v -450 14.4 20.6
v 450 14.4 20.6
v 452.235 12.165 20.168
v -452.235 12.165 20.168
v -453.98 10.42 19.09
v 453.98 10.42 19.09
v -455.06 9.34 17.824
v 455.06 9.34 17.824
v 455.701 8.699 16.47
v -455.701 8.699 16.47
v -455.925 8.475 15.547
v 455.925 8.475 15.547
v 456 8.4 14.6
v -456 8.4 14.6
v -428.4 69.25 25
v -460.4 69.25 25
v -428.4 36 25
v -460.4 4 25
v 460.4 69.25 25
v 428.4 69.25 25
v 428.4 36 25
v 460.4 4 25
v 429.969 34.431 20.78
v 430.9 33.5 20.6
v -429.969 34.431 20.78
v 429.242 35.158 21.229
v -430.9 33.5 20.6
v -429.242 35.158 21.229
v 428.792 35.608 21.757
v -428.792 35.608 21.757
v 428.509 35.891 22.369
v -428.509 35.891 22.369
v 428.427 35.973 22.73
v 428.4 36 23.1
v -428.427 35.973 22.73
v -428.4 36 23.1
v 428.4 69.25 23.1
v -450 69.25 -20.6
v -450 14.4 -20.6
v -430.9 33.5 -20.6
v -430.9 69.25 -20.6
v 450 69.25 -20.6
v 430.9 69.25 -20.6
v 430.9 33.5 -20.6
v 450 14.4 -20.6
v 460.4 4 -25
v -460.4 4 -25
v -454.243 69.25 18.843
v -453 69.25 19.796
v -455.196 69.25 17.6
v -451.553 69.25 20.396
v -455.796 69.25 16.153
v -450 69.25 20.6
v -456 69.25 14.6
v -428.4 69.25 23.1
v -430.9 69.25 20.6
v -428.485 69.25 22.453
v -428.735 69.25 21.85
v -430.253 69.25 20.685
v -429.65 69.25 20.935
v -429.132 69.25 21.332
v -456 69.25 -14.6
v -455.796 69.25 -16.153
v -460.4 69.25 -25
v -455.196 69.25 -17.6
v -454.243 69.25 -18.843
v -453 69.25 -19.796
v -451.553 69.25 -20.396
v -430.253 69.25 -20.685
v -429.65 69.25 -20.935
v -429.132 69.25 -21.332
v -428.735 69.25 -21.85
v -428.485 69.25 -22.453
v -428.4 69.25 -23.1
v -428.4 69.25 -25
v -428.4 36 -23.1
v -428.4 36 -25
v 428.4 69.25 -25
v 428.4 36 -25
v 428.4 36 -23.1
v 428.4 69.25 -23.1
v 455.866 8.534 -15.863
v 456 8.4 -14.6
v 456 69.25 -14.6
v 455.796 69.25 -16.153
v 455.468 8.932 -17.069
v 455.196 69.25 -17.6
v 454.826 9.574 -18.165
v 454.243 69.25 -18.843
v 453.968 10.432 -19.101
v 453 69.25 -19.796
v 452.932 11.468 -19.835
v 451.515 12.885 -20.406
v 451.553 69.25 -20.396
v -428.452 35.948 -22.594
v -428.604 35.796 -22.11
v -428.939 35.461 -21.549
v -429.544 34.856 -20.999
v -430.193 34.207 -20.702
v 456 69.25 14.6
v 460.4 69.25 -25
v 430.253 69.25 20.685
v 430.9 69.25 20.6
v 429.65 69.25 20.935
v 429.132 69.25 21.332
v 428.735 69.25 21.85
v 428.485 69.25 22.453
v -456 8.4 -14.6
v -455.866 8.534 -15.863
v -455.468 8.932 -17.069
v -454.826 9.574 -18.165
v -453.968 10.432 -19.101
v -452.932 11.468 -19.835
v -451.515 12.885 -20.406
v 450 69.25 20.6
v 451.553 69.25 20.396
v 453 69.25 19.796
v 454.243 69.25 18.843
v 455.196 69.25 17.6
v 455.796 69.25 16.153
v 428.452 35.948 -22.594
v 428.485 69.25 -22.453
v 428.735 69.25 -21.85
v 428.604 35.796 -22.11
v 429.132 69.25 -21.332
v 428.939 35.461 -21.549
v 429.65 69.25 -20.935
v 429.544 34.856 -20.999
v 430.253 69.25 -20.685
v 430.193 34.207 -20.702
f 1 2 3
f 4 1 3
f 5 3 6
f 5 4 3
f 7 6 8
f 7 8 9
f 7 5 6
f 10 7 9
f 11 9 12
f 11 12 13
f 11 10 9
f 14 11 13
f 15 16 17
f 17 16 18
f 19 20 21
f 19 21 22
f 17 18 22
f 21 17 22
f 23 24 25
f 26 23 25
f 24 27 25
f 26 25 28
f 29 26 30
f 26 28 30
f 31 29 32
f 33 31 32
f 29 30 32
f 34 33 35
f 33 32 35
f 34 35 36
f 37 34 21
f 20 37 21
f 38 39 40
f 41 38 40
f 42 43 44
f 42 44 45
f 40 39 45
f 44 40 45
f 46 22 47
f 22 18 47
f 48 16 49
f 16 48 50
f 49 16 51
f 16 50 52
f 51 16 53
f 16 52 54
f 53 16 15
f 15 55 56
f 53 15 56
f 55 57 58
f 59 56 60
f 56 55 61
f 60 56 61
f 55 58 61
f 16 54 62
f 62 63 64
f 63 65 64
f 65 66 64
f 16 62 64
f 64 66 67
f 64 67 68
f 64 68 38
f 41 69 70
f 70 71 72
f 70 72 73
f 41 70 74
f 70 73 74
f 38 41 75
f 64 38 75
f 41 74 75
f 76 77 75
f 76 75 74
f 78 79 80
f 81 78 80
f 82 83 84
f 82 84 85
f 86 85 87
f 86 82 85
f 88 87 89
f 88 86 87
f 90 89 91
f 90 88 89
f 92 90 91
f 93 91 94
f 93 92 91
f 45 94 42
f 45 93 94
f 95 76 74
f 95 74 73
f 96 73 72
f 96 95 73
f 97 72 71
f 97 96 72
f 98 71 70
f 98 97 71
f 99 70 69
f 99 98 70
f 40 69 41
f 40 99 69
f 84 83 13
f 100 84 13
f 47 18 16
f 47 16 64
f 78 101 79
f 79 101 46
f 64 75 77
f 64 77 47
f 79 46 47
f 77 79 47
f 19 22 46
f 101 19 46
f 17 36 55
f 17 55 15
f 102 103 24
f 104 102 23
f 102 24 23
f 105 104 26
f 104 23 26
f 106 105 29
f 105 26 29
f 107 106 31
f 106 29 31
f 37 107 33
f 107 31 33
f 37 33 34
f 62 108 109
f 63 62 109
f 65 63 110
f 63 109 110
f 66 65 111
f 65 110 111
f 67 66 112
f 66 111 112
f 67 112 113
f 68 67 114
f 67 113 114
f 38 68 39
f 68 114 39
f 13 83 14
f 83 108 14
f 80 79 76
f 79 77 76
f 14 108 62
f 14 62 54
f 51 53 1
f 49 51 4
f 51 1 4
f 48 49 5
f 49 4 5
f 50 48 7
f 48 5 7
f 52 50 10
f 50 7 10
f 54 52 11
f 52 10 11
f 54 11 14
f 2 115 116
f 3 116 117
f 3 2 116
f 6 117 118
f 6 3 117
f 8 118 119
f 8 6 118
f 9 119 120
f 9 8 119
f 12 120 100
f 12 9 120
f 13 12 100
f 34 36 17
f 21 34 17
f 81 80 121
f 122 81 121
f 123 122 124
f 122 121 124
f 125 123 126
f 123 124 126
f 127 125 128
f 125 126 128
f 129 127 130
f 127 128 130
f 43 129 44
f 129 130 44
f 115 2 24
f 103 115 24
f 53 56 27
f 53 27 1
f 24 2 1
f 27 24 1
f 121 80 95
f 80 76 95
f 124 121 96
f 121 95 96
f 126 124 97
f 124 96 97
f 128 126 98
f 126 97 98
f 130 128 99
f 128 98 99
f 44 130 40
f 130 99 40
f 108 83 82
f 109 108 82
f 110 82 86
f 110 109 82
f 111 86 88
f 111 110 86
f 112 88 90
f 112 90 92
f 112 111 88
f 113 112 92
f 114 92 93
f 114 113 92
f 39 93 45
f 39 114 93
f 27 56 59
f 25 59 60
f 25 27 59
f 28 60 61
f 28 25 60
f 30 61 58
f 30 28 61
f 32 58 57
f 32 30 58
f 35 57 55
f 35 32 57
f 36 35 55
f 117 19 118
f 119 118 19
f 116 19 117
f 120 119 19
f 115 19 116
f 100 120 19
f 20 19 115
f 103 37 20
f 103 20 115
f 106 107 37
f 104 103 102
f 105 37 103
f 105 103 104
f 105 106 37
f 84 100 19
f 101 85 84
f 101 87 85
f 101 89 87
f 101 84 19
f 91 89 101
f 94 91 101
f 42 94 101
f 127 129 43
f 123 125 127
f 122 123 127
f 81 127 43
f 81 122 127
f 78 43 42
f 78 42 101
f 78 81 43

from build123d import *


with BuildPart() as part:
    # По траектории4: sweep along a curve in space
    with BuildLine() as sweep_4_path:
        Line((-460.4, 69.25, 0), (-460.4, 4, 0))
        Line((-460.4, 4, 0), (0, 4, 0))
    # Эскиз2<3> → По траектории4 (sweep)
    with BuildSketch(Plane.XZ.offset(-69.25)):
        with BuildLine():
            Line((-460.4, -25), (-460.4, 25))
            Line((-460.4, 25), (-428.4, 25))
            Line((-428.4, 25), (-428.4, 23.1))
            ThreePointArc((-428.4, 23.1), (-429.132233047, 21.332233047), (-430.9, 20.6))
            Line((-430.9, 20.6), (-450, 20.6))
            ThreePointArc((-450, 20.6), (-454.242640687, 18.842640687), (-456, 14.6))
            Line((-456, 14.6), (-456, -14.6))
            ThreePointArc((-456, -14.6), (-454.242640687, -18.842640687), (-450, -20.6))
            Line((-450, -20.6), (-430.9, -20.6))
            ThreePointArc((-430.9, -20.6), (-429.132233047, -21.332233047), (-428.4, -23.1))
            Line((-428.4, -23.1), (-428.4, -25))
            Line((-428.4, -25), (-460.4, -25))
        make_face()
    sweep(path=sweep_4_path.line, transition=Transition.RIGHT)

    # Зеркальное отражение2: part across plane


with BuildPart() as part_1:
    add(part.part)
    add(part.part.mirror(Plane(origin=(0, 33.5, 23.1), x_dir=(0, 0, 1), z_dir=(-1, 0, 0))))


solid = part_1.part
